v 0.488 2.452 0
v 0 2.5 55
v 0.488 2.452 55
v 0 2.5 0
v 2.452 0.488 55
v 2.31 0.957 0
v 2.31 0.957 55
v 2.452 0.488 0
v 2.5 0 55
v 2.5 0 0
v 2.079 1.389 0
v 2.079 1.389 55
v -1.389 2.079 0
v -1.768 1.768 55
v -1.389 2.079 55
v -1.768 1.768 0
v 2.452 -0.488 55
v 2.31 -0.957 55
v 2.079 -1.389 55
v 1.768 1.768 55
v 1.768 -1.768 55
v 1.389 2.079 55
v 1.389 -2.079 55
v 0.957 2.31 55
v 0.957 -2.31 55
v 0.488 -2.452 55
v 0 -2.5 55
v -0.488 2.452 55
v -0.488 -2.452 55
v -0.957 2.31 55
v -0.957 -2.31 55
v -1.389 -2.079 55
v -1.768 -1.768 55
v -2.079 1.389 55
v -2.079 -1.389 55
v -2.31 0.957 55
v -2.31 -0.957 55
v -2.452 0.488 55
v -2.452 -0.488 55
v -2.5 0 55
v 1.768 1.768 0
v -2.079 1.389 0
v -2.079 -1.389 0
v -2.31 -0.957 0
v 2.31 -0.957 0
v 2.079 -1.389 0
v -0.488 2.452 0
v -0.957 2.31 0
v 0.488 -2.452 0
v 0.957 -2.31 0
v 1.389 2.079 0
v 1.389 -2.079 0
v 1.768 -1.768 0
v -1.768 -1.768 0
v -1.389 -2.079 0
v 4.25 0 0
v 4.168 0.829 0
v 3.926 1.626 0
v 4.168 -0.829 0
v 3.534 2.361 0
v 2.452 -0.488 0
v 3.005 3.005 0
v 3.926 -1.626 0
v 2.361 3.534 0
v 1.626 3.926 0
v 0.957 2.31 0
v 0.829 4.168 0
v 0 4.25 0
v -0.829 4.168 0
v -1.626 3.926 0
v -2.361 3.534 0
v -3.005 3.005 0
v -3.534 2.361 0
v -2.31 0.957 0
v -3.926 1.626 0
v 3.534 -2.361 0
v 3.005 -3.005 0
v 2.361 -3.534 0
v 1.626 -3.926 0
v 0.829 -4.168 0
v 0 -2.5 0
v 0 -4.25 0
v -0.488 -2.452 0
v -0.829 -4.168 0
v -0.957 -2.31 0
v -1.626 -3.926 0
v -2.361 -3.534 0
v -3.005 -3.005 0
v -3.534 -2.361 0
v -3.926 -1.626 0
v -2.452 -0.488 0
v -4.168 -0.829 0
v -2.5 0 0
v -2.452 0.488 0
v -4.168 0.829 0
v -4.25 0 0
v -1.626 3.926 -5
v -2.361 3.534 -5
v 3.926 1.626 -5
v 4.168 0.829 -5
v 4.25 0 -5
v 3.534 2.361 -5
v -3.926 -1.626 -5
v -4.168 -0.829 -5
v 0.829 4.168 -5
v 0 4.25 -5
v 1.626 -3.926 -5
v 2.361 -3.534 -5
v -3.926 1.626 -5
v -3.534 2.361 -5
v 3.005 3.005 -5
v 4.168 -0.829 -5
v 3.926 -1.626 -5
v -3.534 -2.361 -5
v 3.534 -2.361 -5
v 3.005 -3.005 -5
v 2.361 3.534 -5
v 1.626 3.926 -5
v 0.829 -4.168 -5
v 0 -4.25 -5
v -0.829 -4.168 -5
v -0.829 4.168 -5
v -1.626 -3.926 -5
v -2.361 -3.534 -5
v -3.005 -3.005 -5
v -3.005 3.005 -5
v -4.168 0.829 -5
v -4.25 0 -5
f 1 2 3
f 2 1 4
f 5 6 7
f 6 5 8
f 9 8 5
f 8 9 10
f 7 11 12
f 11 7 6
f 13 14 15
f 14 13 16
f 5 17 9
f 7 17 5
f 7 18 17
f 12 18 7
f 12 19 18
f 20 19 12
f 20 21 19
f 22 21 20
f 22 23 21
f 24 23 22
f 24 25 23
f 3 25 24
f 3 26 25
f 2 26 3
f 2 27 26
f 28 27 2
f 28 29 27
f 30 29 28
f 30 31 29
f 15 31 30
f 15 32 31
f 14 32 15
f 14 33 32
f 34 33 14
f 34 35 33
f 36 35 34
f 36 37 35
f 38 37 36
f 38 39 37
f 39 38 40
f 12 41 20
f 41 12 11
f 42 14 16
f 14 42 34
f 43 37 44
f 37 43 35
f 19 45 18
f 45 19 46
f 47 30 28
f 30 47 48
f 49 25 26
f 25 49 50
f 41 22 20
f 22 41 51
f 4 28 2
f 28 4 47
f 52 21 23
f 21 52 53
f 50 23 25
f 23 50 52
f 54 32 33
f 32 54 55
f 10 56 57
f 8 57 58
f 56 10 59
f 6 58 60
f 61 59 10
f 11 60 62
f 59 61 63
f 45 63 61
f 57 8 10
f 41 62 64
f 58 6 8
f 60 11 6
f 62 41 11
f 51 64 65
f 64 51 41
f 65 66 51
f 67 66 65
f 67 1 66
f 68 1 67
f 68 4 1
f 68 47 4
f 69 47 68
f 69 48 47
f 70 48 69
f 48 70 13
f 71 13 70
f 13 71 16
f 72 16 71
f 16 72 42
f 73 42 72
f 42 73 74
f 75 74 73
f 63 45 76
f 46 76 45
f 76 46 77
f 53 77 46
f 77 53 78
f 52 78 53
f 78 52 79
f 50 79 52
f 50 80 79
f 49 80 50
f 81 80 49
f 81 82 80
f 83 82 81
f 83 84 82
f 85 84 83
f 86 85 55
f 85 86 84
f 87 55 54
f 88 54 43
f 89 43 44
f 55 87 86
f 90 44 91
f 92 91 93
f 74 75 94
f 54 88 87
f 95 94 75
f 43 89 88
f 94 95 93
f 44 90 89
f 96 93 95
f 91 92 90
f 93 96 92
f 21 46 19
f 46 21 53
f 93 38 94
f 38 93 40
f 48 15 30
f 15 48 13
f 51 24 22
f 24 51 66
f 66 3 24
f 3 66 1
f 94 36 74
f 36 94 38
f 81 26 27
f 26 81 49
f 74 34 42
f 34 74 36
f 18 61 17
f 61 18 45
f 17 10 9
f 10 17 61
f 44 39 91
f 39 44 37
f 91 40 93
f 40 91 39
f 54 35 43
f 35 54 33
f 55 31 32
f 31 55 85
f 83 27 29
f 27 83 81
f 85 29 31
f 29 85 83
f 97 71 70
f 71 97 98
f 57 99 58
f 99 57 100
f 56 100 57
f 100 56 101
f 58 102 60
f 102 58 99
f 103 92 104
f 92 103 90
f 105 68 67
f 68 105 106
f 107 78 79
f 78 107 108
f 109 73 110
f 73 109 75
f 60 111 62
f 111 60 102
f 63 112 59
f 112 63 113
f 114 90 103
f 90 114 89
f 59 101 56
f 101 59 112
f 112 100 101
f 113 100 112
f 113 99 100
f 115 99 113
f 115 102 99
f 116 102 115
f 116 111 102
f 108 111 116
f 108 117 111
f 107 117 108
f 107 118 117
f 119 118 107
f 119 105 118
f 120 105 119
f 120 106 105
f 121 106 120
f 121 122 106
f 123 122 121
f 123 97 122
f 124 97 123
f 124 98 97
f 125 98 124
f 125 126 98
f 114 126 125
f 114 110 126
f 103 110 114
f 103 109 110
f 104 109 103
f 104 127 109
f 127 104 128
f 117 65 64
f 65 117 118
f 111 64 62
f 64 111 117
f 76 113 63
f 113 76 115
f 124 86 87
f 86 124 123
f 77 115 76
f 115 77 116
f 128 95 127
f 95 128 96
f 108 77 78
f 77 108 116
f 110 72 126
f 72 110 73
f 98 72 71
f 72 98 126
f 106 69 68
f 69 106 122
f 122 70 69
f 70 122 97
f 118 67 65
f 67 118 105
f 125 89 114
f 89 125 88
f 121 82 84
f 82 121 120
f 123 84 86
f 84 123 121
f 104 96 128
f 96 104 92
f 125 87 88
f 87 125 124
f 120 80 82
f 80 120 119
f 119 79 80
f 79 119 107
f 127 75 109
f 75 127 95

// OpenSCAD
// Purchased hardware envelope; no modeled threads, not print.
$fn=32;
union(){cylinder(d=5,h=55);translate([0,0,-5])cylinder(d=8.5,h=5);}
